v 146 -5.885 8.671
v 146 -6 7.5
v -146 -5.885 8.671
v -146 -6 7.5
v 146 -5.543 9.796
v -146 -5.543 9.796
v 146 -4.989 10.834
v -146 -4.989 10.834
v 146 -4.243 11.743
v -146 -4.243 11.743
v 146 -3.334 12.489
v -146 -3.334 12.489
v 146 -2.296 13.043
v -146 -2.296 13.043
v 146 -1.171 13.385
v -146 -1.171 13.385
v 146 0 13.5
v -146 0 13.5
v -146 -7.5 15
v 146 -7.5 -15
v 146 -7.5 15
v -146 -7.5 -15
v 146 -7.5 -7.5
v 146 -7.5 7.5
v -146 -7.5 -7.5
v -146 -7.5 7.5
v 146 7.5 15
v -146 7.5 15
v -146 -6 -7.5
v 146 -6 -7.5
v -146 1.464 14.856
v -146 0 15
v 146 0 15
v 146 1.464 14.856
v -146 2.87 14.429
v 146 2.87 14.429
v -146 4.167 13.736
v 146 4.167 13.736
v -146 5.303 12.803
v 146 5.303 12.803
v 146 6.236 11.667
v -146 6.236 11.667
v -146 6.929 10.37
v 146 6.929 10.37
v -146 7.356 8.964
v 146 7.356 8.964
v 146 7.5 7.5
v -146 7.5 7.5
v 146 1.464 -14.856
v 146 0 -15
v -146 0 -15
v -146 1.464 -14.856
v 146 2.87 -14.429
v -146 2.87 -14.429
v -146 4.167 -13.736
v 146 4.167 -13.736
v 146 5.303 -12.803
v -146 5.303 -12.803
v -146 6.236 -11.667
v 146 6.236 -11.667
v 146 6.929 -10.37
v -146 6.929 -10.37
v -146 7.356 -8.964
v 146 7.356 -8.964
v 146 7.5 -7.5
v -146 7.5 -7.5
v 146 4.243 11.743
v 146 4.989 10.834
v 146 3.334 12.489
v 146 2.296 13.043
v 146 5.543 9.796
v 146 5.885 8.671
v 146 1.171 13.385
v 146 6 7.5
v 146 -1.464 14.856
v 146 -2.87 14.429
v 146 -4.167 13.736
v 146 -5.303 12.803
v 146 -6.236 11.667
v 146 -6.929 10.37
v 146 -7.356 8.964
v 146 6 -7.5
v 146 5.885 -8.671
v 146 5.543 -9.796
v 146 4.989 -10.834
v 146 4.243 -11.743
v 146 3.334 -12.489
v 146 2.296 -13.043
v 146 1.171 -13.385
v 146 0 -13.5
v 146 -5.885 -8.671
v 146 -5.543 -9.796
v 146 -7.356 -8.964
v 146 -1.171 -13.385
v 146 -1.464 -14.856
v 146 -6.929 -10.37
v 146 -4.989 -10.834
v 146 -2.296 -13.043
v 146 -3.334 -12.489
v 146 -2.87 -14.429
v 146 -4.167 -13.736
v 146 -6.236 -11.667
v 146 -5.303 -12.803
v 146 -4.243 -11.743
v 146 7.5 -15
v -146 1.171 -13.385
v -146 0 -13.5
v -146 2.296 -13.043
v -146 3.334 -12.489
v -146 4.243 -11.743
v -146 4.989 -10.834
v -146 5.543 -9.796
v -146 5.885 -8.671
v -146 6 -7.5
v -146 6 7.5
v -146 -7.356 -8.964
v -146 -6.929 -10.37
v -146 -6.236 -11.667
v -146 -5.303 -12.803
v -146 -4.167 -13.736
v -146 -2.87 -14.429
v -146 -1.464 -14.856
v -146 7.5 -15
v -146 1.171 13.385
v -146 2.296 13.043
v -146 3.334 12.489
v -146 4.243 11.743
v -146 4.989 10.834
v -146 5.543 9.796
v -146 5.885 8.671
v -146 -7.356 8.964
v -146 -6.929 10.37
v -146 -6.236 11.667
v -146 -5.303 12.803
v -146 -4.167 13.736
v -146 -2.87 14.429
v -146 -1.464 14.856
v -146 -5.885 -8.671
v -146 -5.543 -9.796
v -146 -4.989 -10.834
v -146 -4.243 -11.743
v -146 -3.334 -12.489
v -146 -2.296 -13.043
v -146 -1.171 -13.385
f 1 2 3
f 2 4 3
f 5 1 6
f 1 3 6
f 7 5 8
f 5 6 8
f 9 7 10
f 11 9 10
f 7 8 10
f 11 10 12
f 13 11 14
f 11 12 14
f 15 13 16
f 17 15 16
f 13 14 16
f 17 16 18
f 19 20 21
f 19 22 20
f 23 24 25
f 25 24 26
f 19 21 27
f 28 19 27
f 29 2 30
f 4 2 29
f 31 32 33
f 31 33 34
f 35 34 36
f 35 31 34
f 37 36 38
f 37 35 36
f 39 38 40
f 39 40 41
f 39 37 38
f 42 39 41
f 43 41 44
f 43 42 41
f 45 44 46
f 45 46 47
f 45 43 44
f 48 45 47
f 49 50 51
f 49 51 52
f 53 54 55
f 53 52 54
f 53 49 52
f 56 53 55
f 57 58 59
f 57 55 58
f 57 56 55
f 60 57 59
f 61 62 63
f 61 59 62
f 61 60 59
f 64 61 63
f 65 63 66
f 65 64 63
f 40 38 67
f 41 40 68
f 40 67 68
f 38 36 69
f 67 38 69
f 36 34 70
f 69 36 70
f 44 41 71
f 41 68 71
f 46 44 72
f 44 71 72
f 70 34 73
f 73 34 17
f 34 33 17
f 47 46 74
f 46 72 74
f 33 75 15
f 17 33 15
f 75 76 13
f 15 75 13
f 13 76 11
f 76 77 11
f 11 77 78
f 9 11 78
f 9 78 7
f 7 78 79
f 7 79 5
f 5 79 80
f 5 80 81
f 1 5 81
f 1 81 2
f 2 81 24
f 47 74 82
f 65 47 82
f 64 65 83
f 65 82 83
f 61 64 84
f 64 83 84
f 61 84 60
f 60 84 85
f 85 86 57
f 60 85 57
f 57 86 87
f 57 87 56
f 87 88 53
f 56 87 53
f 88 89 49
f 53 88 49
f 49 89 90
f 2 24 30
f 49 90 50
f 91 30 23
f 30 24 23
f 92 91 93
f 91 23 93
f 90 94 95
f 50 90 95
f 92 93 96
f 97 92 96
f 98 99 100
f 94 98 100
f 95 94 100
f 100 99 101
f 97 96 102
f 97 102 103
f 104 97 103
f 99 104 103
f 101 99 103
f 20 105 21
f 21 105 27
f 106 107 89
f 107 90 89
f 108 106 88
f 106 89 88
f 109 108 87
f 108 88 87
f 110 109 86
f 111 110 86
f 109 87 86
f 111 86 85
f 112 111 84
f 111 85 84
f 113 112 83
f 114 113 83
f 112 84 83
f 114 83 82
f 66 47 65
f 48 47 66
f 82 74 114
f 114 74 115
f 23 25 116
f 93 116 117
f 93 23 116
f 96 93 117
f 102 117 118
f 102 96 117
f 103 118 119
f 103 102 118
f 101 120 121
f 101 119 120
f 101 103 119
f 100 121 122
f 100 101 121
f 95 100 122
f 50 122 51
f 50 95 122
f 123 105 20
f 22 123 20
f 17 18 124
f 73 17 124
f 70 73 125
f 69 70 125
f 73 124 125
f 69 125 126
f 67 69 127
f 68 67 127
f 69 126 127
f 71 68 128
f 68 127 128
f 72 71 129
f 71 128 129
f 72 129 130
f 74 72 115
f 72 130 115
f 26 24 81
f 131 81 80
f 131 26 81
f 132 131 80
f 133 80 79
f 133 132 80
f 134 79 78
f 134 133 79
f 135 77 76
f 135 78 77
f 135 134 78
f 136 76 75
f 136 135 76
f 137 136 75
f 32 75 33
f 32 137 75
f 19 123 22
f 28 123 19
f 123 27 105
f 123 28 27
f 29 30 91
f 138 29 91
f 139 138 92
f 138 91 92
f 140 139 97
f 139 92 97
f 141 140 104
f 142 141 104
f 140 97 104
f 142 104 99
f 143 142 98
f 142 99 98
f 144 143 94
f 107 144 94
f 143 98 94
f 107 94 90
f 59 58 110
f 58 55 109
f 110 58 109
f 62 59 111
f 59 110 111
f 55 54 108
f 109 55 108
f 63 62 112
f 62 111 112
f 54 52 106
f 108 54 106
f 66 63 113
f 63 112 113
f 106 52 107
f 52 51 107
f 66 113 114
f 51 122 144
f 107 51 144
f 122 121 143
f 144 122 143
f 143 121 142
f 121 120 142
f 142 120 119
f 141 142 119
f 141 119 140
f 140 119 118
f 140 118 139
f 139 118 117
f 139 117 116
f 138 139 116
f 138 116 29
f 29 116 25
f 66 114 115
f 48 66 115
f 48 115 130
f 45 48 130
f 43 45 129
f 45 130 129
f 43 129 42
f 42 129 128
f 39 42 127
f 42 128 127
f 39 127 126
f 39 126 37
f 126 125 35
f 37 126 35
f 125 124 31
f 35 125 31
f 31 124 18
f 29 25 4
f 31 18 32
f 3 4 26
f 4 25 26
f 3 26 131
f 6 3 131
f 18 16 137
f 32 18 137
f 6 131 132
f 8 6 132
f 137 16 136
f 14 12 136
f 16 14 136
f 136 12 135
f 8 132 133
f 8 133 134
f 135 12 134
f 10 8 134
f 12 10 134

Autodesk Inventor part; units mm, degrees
ref_plane "YZ Plane" through (0, 0, 0) normal (1, 0, 0) x (0, 1, 0)
ref_plane "XZ Plane" through (0, 0, 0) normal (0, 1, 0) x (-1, 0, 0)
ref_plane "XY Plane" through (0, 0, 0) normal (0, 0, 1) x (1, 0, 0)
sketch "Sketch1" plane through (0, 0, 0) normal (0, 1, 0) x (-1, 0, 0)
  line L0 (-150, 15) -> (150, 15)
  line L1 (150, 15) -> (150, -15)
  line L2 (150, -15) -> (-150, -15)
  line L3 (-150, -15) -> (-150, 15)
  point P0 (0, -15)
  point P1 (0, 0)
  point P2 (150, 0)
  dimension "d1" = 30
  dimension "Length" = 300
sketch "Sketch2" plane through (0, 0, 0) normal (0, 1, 0) x (-1, 0, 0)
  line L0 (-150, 15) -> (150, 15) projected
  line L1 (150, -15) -> (-150, -15) projected
  line L2 (146, 15) -> (-146, 15)
  line L3 (-146, 15) -> (-146, -15)
  line L4 (-146, -15) -> (146, -15)
  line L5 (146, -15) -> (146, 15)
  point P0 (0, 0)
  dimension "d2" = 4
  dimension "d3" = 4
  dimension "Bar_Length" = 292
extrude "Extrusion1" add sketch "Sketch2" along normal mid plane 15
fillet "Fillet1" radius 7.5 4 edges at (0, -7.5, 15) (0, 7.5, 15) (0, -7.5, -15) (0, 7.5, -15)
shell "Shell1" thickness 1.5 removed faces 2 at (-146, 2.5, 2.5002) at (146, 2.5, -2.5002)
sketch "Sketch3" plane through (-146, 0, -7.5) normal (-1, 0, 0) x (0, 0, 1)
  line L0 (22.5, 7.5) -> (-7.5, 7.5)
  line L1 (-7.5, 7.5) -> (-7.5, -7.5)
  line L2 (-7.5, -7.5) -> (22.5, -7.5)
  line L3 (22.5, -7.5) -> (22.5, 7.5)
  arc A0 (15, -7.5) -> (15, 7.5) centre (15, 0) ccw projected
  arc A1 (0, 7.5) -> (0, -7.5) centre (0, 0) ccw projected
  line L4 (0, 7.5) -> (15, 7.5) projected
  line L5 (15, -7.5) -> (0, -7.5) projected
  point P0 (7.5, 0)
extrude "Extrusion2" add sketch "Sketch3" against normal up to surface (292 mm away) separate body
equation "\"d6\" = 0.5 * d4"
equation "\"d4\" = 15"
properties part number "Oval Bar 30x15"
